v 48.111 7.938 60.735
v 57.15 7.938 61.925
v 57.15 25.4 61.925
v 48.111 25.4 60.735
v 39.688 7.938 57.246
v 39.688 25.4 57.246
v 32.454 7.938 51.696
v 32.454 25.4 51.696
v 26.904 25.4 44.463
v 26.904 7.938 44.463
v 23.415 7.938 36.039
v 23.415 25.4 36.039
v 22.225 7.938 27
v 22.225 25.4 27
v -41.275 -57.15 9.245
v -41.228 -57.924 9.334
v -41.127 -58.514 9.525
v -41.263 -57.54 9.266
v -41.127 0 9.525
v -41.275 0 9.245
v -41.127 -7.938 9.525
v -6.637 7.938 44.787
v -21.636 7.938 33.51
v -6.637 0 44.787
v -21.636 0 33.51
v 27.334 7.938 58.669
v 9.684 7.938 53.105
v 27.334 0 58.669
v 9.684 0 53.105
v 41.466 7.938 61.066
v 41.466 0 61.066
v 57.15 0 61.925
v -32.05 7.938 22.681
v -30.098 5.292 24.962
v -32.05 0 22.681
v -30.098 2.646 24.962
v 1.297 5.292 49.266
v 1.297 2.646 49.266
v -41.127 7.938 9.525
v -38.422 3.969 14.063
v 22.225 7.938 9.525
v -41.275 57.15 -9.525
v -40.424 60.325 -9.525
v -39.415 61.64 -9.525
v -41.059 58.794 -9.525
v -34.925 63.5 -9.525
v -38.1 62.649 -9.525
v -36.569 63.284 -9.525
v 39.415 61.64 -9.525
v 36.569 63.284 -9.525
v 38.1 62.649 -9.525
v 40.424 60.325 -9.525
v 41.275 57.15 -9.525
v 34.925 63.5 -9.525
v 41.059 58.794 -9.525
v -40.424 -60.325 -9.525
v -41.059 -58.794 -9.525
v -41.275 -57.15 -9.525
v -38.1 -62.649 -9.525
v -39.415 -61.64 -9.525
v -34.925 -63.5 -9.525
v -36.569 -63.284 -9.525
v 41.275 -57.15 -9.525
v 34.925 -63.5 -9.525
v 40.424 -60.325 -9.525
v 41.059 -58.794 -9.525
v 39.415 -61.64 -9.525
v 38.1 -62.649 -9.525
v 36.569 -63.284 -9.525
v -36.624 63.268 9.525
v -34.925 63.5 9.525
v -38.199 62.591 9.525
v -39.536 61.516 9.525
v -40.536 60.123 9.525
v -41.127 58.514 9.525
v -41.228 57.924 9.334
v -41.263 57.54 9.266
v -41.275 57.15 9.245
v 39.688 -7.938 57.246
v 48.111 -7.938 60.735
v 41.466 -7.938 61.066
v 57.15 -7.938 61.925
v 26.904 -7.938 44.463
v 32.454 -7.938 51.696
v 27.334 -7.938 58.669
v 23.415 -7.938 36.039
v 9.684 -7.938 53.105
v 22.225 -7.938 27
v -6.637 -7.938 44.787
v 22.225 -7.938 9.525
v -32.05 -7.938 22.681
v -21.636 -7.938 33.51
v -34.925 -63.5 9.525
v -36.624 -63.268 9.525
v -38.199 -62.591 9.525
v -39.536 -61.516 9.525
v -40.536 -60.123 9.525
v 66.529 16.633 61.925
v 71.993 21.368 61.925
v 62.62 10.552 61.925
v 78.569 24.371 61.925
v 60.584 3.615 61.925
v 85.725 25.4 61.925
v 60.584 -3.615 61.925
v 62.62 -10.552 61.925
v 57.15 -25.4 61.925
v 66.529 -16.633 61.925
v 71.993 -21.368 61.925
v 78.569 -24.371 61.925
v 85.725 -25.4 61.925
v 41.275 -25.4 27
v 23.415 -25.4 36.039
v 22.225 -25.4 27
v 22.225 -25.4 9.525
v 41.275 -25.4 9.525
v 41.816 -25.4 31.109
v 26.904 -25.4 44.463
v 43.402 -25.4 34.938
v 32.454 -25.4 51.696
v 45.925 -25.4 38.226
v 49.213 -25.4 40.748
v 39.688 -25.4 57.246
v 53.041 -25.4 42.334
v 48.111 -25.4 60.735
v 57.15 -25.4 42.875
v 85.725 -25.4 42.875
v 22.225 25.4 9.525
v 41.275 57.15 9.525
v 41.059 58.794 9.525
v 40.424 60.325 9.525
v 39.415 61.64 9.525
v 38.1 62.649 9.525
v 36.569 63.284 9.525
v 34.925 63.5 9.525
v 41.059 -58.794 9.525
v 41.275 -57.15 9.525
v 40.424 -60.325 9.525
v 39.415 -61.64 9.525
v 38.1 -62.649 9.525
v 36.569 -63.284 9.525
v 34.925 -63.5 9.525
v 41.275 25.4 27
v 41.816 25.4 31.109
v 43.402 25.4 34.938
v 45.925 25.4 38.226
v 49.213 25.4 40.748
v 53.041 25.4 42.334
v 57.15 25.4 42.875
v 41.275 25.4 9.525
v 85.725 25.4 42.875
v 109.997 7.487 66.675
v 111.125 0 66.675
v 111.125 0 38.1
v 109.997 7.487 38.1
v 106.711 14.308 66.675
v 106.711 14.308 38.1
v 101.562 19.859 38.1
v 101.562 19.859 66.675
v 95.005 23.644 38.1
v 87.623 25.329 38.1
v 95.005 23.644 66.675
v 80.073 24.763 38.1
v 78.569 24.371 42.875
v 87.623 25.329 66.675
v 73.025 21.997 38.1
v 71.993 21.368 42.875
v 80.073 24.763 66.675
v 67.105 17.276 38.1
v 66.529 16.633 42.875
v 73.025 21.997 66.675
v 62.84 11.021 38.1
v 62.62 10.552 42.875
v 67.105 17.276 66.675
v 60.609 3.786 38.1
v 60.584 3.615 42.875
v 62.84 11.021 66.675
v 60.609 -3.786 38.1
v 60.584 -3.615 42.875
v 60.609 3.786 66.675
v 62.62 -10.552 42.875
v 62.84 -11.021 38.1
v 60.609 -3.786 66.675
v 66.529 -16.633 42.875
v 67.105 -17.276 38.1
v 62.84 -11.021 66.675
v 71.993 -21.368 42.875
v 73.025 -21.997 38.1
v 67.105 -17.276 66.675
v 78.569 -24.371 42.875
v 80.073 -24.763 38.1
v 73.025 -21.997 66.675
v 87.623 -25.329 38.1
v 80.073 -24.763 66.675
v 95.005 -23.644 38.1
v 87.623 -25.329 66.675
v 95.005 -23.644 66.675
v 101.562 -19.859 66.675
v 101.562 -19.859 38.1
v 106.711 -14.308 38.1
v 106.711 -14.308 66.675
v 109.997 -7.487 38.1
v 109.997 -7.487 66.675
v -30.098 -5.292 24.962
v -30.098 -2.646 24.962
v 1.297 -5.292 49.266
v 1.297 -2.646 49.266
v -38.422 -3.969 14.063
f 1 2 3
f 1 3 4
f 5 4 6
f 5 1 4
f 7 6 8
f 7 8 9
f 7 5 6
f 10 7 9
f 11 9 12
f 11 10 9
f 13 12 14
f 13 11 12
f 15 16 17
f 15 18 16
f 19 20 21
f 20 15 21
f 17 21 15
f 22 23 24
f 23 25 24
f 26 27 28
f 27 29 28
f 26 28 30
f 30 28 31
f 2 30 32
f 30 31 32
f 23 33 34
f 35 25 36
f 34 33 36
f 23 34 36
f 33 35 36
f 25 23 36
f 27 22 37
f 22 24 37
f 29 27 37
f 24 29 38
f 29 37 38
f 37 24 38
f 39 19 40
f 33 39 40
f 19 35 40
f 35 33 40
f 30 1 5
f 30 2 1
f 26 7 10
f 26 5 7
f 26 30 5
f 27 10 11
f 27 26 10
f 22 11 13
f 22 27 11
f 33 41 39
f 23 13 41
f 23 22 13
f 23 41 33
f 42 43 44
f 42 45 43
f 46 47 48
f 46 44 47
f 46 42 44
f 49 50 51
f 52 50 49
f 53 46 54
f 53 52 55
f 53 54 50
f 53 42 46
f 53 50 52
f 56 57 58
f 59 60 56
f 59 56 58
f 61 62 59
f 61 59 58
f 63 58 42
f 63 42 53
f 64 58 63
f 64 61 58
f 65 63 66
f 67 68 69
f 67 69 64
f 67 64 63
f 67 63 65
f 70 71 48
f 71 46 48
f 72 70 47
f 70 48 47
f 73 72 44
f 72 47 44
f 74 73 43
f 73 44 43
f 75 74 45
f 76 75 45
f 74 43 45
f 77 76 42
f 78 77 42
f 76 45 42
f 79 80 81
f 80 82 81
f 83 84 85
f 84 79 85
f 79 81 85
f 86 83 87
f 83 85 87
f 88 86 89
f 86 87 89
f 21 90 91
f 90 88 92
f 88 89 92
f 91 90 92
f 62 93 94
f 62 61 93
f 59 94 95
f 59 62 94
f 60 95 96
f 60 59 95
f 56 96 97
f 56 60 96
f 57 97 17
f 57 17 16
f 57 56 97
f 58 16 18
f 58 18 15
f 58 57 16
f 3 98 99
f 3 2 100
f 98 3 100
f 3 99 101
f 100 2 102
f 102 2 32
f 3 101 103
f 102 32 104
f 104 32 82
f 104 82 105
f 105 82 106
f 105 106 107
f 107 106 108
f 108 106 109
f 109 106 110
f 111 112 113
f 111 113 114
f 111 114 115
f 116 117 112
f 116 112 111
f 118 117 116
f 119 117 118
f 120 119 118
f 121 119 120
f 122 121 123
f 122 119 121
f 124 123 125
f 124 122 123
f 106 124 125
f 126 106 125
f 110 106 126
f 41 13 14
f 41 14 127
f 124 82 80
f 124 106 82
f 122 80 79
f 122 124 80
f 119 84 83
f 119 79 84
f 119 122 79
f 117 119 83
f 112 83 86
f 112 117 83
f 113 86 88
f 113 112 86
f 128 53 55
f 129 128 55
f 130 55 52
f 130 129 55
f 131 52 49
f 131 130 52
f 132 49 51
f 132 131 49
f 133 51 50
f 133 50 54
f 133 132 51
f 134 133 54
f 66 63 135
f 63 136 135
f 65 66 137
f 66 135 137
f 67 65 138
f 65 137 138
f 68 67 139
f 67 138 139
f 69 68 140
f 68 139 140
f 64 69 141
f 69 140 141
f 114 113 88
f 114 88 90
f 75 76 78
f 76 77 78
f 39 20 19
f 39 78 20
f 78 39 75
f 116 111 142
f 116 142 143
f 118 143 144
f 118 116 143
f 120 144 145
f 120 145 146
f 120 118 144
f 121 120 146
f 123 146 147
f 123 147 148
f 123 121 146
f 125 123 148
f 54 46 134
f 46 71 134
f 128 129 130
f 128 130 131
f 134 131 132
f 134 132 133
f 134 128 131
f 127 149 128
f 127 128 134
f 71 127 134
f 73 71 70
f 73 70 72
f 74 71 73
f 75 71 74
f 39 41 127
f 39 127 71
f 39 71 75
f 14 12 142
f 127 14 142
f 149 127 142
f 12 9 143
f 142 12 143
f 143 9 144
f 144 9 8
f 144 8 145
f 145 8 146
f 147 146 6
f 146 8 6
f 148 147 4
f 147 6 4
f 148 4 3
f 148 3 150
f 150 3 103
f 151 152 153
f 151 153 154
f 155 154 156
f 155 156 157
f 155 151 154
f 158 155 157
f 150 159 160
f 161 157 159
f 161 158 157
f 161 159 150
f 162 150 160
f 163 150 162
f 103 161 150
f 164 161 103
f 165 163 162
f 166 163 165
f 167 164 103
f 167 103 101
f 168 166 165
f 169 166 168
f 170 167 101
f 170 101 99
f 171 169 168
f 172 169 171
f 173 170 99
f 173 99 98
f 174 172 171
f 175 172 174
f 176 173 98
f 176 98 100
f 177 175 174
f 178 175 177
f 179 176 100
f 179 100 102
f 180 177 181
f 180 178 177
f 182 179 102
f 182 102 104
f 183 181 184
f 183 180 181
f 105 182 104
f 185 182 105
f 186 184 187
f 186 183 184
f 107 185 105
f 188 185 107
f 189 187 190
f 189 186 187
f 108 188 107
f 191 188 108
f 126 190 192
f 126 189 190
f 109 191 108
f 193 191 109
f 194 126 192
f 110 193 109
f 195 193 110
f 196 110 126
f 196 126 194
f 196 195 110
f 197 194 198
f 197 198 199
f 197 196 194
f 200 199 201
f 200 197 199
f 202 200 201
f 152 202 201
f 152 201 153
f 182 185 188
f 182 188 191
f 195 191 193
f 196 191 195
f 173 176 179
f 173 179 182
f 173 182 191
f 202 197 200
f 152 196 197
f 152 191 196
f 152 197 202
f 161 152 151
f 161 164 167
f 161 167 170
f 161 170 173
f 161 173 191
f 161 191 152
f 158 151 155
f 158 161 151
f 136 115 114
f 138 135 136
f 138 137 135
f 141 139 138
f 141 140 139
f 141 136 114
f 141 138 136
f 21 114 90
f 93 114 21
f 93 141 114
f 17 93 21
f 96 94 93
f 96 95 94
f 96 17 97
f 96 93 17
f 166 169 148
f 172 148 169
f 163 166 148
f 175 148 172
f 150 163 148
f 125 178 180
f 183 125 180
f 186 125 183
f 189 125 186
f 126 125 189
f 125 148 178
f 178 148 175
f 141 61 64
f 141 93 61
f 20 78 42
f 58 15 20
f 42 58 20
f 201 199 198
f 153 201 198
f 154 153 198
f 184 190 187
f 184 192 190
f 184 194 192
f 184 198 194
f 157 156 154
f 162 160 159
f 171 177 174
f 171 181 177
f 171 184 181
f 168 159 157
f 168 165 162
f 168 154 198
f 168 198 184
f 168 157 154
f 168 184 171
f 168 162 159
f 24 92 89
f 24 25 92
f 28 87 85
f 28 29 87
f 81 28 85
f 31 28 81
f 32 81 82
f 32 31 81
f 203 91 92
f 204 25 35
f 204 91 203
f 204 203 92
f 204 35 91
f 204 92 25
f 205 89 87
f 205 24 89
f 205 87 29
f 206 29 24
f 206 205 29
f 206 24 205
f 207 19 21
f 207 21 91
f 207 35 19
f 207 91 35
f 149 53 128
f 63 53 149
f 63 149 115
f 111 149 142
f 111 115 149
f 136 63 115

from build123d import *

# Parameters (mm, degrees)
F1_DEPTH = 63.5
F2_DEPTH = 25.4
F3_DEPTH = 7.9375
F0_W     = 25.4
F0_H     = 19.05
F4_DEPTH = 25.4
F6_R     = 6.35


with BuildPart() as f1:
    # F0 (on Front) → F1 (new body, symmetric)
    with BuildSketch(Plane.XZ):
        with BuildLine():
            Line((-41.275, 9.2450247044), (-41.275, -9.525))
            Line((-41.275, -9.525), (41.275, -9.525))
            Line((41.275, -9.525), (41.275, 9.525))
            Line((41.275, 9.525), (22.225, 9.525))
            Line((22.225, 9.525), (-41.1268438883, 9.525))
            add(Edge.make_bspline(
                [(-41.275, 9.2450247044), (-41.2721793897, 9.2493286898), (-41.2526024622, 9.2855029924), (-41.1980769813, 9.3907074254), (-41.1268438883, 9.525)],
                knots=[0.0426221028, 0.0426221028, 0.0426221028, 0.0426221028, 0.0482250452, 0.0779432741, 0.0779432741, 0.0779432741, 0.0779432741], degree=3))
        make_face()
    extrude(amount=F1_DEPTH, both=True)

    # F0 (on Front) → F2 (join, symmetric)
    with BuildSketch(Plane.XZ):
        with BuildLine():
            Line((22.225, 9.525), (41.275, 9.525))
            Line((41.275, 9.525), (41.275, 27.0002))
            ThreePointArc((41.275, 27.0002), (45.9246798487, 38.2255201513), (57.15, 42.8752))
            Line((57.15, 42.8752), (60.325, 42.8752))
            Line((60.325, 42.8752), (60.325, 61.9252))
            Line((60.325, 61.9252), (57.15, 61.9252))
            ThreePointArc((57.15, 61.9252), (32.4542956671, 51.6959043329), (22.225, 27.0002))
            Line((22.225, 27.0002), (22.225, 9.525))
        make_face()
    extrude(amount=F2_DEPTH, both=True)

    # F0 (on Front) → F3 (join, symmetric)
    with BuildSketch(Plane.XZ):
        with BuildLine():
            add(Edge.make_bspline(
                [(-41.1268438883, 9.525), (-38.9167205077, 13.6916470796), (-12.2967160163, 61.9252), (57.15, 61.9252)],
                knots=[0.0779432741, 0.0779432741, 0.0779432741, 0.0779432741, 1, 1, 1, 1], degree=3))
            Line((-41.1268438883, 9.525), (22.225, 9.525))
            Line((22.225, 9.525), (22.225, 27.0002))
            ThreePointArc((22.225, 27.0002), (32.4542956671, 51.6959043329), (57.15, 61.9252))
        make_face()
    extrude(amount=F3_DEPTH, both=True)

    # F0 (on Front) → F4 (join, symmetric)
    with BuildSketch(Plane.XZ):
        with Locations((73.025, 52.4002)):
            Rectangle(F0_W, F0_H)
    extrude(amount=F4_DEPTH, both=True)

    # F0 (on Front) → F5 (revolve)
    with BuildSketch(Plane.XZ):
        Polygon((85.725, 66.675), (85.725, 61.9252), (85.725, 42.8752), (85.725, 38.1), (111.125, 38.1), (111.125, 66.675), align=None)
    revolve(axis=Axis((85.725, 0, 52.3875), (0, 0, 1)))

    # F6
    f6_edges = [f1.edges().sort_by_distance(p)[0] for p in [
        (41.275, -63.5, 0),
        (-41.275, -63.5, -0.139988),
        (-41.275, 63.5, -0.139988),
        (41.275, 63.5, 0),
    ]]
    fillet(f6_edges, radius=F6_R)


solid = f1.part
